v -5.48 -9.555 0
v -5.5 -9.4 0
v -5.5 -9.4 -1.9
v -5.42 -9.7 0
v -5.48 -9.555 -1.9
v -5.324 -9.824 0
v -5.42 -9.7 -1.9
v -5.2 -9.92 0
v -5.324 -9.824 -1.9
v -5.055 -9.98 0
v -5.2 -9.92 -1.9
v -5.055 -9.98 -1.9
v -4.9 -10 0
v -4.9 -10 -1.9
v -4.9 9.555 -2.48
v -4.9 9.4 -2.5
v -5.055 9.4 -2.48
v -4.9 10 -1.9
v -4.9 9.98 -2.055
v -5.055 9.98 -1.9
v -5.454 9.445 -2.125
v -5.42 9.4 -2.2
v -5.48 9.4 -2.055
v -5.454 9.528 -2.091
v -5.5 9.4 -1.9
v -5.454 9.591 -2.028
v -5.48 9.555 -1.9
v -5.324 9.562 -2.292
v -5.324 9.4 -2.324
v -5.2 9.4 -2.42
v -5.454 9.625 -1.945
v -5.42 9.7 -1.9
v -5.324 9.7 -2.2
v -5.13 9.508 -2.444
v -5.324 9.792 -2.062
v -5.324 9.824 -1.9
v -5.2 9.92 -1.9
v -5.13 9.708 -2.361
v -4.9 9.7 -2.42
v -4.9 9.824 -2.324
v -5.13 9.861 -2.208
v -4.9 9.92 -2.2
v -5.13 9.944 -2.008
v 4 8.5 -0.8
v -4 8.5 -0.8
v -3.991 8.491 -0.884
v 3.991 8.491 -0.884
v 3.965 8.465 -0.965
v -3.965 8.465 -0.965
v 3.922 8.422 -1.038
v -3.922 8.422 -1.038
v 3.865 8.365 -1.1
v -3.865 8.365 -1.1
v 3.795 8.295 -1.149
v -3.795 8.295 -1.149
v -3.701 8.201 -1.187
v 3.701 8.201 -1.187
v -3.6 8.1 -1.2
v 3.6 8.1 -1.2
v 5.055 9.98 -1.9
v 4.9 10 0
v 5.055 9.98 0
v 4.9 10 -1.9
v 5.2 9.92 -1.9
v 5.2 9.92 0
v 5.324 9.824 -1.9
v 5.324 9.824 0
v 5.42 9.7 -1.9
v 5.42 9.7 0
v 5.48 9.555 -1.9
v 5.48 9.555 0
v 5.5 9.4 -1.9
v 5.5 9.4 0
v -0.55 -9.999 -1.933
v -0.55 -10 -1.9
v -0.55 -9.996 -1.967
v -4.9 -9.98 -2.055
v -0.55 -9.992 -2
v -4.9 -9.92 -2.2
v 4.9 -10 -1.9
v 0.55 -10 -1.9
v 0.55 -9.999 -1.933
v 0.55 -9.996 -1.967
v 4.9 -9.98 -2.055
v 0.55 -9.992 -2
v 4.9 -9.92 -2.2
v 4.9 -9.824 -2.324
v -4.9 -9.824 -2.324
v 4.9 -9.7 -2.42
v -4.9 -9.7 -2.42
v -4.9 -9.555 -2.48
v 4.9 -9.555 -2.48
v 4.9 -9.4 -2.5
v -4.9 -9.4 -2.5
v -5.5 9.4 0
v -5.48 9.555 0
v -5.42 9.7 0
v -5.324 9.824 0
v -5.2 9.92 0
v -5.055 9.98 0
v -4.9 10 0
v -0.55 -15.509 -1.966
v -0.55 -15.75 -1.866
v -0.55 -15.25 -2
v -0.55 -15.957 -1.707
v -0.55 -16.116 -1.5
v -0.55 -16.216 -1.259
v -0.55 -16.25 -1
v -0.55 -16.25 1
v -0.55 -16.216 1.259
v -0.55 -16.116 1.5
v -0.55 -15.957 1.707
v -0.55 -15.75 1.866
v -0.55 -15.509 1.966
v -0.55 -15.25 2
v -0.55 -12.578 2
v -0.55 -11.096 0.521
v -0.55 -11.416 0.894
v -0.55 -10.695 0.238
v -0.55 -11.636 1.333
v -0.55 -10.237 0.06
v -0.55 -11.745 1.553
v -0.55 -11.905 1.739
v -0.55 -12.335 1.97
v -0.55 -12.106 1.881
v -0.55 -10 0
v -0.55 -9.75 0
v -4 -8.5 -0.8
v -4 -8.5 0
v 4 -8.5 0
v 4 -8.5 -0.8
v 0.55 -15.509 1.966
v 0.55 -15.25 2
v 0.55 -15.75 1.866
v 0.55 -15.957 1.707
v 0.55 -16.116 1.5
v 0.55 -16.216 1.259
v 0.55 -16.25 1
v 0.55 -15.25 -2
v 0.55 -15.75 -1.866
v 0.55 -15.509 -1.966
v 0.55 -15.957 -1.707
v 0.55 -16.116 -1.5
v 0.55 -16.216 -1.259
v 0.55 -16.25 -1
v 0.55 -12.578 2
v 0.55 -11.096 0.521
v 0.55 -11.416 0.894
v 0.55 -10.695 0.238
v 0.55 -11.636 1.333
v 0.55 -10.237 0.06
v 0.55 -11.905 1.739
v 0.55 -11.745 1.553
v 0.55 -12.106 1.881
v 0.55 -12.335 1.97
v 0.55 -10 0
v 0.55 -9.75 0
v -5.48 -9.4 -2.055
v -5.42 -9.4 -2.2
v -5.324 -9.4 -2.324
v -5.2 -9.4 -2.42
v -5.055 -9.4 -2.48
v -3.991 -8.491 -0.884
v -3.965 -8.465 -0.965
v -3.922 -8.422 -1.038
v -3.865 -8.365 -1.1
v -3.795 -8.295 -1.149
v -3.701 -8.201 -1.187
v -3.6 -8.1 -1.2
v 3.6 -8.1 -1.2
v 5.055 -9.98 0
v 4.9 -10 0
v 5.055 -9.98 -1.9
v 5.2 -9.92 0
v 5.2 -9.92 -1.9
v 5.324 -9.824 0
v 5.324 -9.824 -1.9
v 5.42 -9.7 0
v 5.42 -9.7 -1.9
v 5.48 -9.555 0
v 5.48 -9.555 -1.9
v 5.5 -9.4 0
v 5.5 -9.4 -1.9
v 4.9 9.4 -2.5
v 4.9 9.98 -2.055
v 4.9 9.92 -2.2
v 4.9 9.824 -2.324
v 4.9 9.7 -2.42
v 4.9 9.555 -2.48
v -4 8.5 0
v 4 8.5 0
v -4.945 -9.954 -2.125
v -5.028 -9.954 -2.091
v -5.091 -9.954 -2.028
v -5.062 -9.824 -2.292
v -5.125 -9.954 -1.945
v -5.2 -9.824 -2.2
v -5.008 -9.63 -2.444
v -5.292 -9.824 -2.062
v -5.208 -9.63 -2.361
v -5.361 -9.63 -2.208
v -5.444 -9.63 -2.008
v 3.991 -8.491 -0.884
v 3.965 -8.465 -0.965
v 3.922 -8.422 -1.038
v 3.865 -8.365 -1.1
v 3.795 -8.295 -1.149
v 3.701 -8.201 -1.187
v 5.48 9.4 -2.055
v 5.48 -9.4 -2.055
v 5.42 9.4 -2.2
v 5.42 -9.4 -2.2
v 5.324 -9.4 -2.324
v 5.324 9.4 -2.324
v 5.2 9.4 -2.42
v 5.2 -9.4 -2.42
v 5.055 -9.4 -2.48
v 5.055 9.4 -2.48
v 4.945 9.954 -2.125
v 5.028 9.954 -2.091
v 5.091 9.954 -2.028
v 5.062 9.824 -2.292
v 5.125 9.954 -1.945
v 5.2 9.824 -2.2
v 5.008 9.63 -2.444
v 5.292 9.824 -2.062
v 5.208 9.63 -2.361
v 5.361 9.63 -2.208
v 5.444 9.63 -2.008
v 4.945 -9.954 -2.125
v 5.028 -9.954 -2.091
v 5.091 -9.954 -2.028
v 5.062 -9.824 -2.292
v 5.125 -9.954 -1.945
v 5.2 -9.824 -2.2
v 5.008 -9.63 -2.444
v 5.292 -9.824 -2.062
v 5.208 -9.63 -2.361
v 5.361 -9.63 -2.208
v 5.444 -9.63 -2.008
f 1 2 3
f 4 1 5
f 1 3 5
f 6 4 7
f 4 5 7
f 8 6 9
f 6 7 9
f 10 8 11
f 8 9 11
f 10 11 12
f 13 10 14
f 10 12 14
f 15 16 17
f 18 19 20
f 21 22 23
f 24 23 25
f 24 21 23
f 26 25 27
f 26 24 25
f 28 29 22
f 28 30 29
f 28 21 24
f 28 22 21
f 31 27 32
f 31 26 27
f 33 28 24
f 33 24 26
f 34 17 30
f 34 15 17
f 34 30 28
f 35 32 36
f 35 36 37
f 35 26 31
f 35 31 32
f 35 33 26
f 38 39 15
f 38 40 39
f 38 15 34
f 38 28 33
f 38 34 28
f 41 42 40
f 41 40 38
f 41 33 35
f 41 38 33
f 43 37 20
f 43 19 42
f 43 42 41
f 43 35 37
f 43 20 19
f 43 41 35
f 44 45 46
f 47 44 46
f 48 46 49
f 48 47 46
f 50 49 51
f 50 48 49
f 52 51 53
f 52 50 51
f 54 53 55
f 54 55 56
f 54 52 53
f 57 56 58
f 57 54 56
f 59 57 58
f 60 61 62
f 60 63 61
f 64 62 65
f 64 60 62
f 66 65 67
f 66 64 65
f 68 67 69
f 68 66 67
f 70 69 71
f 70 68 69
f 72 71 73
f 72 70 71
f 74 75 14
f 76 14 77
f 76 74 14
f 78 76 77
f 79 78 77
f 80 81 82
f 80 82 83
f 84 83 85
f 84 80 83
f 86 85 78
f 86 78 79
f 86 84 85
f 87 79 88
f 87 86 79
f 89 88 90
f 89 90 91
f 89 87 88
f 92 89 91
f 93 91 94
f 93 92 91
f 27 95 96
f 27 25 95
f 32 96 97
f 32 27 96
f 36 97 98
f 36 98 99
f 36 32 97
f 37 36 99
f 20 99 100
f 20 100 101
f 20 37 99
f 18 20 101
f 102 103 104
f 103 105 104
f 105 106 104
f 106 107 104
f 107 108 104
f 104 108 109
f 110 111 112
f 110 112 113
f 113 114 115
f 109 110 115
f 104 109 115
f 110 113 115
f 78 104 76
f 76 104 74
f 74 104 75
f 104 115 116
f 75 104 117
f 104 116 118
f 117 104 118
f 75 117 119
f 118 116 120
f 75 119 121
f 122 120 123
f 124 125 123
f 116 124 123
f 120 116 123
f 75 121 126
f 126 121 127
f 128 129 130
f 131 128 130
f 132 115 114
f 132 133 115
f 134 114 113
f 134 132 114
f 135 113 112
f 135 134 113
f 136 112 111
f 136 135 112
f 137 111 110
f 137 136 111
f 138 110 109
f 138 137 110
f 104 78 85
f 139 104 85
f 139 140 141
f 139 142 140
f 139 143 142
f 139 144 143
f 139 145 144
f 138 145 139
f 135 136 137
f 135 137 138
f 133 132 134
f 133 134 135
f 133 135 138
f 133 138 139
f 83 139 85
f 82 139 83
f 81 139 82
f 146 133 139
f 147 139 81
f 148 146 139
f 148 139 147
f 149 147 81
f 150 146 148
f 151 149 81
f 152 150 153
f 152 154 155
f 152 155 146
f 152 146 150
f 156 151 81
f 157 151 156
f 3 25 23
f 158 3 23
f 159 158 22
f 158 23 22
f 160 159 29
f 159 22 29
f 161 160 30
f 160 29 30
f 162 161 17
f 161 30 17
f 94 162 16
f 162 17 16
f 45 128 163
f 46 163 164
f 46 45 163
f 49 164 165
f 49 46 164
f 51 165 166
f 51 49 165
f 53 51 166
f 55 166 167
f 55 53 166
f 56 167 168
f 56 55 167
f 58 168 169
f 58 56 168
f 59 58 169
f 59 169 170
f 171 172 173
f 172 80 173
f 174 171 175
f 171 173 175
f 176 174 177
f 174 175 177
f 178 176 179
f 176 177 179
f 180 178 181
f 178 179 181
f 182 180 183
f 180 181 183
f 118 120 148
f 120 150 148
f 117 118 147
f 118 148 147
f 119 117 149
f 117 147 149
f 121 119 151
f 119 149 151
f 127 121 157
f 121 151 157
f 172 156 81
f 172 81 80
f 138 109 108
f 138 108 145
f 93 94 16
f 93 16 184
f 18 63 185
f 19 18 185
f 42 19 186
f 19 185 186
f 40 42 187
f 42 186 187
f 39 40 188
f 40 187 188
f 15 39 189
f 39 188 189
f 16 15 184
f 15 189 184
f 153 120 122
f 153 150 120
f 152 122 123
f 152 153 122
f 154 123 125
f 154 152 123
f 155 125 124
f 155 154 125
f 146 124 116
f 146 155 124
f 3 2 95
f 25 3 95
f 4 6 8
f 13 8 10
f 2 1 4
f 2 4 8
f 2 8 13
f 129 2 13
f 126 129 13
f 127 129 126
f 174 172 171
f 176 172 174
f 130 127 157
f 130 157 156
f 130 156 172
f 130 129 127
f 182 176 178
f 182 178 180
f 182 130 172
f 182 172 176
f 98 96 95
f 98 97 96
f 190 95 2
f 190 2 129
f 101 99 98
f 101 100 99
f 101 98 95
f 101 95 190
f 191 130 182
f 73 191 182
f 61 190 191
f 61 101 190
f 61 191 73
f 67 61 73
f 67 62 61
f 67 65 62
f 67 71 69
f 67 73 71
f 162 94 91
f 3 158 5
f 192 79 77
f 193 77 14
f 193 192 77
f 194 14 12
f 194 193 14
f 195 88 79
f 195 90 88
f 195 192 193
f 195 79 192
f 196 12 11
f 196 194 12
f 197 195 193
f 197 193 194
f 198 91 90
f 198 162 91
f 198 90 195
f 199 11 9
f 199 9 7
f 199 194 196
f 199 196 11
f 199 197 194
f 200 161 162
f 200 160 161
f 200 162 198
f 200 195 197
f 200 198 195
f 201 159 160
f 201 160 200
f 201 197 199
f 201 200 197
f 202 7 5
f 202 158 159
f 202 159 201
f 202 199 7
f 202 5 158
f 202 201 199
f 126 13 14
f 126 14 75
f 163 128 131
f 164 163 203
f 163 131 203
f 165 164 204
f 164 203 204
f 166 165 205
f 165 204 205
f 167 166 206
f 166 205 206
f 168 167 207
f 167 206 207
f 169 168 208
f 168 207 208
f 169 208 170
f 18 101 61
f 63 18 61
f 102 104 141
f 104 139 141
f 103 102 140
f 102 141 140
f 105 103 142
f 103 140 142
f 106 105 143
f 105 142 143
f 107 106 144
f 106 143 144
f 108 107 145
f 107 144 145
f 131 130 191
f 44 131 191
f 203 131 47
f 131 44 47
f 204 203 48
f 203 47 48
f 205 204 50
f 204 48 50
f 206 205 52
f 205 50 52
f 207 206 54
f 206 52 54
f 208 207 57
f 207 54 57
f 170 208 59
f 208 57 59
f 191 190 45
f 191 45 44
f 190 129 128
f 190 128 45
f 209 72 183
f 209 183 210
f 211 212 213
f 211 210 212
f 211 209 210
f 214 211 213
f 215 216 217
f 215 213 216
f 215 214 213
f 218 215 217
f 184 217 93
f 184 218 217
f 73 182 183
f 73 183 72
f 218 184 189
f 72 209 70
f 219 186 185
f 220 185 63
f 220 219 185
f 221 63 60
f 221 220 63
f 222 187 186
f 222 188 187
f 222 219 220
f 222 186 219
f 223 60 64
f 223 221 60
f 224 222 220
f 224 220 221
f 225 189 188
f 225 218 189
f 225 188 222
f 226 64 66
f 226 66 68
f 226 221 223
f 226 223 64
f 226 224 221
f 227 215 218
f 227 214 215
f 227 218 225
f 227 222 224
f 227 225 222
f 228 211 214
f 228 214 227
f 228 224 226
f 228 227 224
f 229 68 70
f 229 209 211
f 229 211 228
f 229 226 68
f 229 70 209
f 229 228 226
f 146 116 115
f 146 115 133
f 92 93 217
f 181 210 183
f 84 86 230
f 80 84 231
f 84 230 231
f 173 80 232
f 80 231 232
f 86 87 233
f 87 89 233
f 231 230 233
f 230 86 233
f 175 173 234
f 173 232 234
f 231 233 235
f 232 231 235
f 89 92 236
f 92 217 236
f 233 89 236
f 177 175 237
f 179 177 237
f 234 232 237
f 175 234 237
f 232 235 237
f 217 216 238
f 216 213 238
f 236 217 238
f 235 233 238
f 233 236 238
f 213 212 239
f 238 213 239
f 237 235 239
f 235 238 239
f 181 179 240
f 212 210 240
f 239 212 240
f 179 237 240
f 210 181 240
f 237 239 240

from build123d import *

# Parameters (mm, degrees)
F0_W     = 11
F0_H     = 20
F1_DEPTH = 2.5
F2_W     = 8
F2_H     = 17
F3_DEPTH = 1.2
F4_R     = 0.4
F5_R     = 0.6
F6_W     = 1.1
F6_H     = 6.5
F7_DEPTH = 2
F8_R     = 2
F9_DEPTH = 25
F10_R    = 1


with BuildPart() as f1:
    # F0 (on Top) → F1 (new body)
    with BuildSketch(Plane.XY):
        Rectangle(F0_W, F0_H)
    extrude(amount=-F1_DEPTH)

    # F2 (on face) → F3 (cut)
    with BuildSketch(Plane.XY):
        Rectangle(F2_W, F2_H)
    extrude(amount=-F3_DEPTH, mode=Mode.SUBTRACT)

    # F4
    f4_edges = [f1.edges().sort_by_distance(p)[0] for p in [
        (4, 0, -1.2),
        (0, 8.5, -1.2),
        (-4, 0, -1.2),
        (0, -8.5, -1.2),
    ]]
    fillet(f4_edges, radius=F4_R)

    # F5
    f5_edges = [f1.edges().sort_by_distance(p)[0] for p in [
        (5.5, 0, -2.5),
        (0, 10, -2.5),
        (-5.5, 0, -2.5),
        (0, -10, -2.5),
        (5.5, -10, -1.25),
        (-5.5, -10, -1.25),
        (-5.5, 10, -1.25),
        (5.5, 10, -1.25),
    ]]
    fillet(f5_edges, radius=F5_R)

    # F6 (on face) → F7 (join, symmetric)
    with BuildSketch(Plane.XY):
        with Locations((0, -13)):
            Rectangle(F6_W, F6_H)
    extrude(amount=F7_DEPTH, both=True)

    # F8 (on face) → F9 (cut)
    with BuildSketch(Plane.YZ.offset(0.55)):
        with Locations((-9.75, 2)):
            Circle(F8_R)
    extrude(amount=-F9_DEPTH, mode=Mode.SUBTRACT)

    # F10
    f10_edges = [f1.edges().sort_by_distance(p)[0] for p in [
        (0, -16.25, 2),
        (0, -16.25, -2),
        (0, -11.75, 2),
    ]]
    fillet(f10_edges, radius=F10_R)


solid = f1.part
